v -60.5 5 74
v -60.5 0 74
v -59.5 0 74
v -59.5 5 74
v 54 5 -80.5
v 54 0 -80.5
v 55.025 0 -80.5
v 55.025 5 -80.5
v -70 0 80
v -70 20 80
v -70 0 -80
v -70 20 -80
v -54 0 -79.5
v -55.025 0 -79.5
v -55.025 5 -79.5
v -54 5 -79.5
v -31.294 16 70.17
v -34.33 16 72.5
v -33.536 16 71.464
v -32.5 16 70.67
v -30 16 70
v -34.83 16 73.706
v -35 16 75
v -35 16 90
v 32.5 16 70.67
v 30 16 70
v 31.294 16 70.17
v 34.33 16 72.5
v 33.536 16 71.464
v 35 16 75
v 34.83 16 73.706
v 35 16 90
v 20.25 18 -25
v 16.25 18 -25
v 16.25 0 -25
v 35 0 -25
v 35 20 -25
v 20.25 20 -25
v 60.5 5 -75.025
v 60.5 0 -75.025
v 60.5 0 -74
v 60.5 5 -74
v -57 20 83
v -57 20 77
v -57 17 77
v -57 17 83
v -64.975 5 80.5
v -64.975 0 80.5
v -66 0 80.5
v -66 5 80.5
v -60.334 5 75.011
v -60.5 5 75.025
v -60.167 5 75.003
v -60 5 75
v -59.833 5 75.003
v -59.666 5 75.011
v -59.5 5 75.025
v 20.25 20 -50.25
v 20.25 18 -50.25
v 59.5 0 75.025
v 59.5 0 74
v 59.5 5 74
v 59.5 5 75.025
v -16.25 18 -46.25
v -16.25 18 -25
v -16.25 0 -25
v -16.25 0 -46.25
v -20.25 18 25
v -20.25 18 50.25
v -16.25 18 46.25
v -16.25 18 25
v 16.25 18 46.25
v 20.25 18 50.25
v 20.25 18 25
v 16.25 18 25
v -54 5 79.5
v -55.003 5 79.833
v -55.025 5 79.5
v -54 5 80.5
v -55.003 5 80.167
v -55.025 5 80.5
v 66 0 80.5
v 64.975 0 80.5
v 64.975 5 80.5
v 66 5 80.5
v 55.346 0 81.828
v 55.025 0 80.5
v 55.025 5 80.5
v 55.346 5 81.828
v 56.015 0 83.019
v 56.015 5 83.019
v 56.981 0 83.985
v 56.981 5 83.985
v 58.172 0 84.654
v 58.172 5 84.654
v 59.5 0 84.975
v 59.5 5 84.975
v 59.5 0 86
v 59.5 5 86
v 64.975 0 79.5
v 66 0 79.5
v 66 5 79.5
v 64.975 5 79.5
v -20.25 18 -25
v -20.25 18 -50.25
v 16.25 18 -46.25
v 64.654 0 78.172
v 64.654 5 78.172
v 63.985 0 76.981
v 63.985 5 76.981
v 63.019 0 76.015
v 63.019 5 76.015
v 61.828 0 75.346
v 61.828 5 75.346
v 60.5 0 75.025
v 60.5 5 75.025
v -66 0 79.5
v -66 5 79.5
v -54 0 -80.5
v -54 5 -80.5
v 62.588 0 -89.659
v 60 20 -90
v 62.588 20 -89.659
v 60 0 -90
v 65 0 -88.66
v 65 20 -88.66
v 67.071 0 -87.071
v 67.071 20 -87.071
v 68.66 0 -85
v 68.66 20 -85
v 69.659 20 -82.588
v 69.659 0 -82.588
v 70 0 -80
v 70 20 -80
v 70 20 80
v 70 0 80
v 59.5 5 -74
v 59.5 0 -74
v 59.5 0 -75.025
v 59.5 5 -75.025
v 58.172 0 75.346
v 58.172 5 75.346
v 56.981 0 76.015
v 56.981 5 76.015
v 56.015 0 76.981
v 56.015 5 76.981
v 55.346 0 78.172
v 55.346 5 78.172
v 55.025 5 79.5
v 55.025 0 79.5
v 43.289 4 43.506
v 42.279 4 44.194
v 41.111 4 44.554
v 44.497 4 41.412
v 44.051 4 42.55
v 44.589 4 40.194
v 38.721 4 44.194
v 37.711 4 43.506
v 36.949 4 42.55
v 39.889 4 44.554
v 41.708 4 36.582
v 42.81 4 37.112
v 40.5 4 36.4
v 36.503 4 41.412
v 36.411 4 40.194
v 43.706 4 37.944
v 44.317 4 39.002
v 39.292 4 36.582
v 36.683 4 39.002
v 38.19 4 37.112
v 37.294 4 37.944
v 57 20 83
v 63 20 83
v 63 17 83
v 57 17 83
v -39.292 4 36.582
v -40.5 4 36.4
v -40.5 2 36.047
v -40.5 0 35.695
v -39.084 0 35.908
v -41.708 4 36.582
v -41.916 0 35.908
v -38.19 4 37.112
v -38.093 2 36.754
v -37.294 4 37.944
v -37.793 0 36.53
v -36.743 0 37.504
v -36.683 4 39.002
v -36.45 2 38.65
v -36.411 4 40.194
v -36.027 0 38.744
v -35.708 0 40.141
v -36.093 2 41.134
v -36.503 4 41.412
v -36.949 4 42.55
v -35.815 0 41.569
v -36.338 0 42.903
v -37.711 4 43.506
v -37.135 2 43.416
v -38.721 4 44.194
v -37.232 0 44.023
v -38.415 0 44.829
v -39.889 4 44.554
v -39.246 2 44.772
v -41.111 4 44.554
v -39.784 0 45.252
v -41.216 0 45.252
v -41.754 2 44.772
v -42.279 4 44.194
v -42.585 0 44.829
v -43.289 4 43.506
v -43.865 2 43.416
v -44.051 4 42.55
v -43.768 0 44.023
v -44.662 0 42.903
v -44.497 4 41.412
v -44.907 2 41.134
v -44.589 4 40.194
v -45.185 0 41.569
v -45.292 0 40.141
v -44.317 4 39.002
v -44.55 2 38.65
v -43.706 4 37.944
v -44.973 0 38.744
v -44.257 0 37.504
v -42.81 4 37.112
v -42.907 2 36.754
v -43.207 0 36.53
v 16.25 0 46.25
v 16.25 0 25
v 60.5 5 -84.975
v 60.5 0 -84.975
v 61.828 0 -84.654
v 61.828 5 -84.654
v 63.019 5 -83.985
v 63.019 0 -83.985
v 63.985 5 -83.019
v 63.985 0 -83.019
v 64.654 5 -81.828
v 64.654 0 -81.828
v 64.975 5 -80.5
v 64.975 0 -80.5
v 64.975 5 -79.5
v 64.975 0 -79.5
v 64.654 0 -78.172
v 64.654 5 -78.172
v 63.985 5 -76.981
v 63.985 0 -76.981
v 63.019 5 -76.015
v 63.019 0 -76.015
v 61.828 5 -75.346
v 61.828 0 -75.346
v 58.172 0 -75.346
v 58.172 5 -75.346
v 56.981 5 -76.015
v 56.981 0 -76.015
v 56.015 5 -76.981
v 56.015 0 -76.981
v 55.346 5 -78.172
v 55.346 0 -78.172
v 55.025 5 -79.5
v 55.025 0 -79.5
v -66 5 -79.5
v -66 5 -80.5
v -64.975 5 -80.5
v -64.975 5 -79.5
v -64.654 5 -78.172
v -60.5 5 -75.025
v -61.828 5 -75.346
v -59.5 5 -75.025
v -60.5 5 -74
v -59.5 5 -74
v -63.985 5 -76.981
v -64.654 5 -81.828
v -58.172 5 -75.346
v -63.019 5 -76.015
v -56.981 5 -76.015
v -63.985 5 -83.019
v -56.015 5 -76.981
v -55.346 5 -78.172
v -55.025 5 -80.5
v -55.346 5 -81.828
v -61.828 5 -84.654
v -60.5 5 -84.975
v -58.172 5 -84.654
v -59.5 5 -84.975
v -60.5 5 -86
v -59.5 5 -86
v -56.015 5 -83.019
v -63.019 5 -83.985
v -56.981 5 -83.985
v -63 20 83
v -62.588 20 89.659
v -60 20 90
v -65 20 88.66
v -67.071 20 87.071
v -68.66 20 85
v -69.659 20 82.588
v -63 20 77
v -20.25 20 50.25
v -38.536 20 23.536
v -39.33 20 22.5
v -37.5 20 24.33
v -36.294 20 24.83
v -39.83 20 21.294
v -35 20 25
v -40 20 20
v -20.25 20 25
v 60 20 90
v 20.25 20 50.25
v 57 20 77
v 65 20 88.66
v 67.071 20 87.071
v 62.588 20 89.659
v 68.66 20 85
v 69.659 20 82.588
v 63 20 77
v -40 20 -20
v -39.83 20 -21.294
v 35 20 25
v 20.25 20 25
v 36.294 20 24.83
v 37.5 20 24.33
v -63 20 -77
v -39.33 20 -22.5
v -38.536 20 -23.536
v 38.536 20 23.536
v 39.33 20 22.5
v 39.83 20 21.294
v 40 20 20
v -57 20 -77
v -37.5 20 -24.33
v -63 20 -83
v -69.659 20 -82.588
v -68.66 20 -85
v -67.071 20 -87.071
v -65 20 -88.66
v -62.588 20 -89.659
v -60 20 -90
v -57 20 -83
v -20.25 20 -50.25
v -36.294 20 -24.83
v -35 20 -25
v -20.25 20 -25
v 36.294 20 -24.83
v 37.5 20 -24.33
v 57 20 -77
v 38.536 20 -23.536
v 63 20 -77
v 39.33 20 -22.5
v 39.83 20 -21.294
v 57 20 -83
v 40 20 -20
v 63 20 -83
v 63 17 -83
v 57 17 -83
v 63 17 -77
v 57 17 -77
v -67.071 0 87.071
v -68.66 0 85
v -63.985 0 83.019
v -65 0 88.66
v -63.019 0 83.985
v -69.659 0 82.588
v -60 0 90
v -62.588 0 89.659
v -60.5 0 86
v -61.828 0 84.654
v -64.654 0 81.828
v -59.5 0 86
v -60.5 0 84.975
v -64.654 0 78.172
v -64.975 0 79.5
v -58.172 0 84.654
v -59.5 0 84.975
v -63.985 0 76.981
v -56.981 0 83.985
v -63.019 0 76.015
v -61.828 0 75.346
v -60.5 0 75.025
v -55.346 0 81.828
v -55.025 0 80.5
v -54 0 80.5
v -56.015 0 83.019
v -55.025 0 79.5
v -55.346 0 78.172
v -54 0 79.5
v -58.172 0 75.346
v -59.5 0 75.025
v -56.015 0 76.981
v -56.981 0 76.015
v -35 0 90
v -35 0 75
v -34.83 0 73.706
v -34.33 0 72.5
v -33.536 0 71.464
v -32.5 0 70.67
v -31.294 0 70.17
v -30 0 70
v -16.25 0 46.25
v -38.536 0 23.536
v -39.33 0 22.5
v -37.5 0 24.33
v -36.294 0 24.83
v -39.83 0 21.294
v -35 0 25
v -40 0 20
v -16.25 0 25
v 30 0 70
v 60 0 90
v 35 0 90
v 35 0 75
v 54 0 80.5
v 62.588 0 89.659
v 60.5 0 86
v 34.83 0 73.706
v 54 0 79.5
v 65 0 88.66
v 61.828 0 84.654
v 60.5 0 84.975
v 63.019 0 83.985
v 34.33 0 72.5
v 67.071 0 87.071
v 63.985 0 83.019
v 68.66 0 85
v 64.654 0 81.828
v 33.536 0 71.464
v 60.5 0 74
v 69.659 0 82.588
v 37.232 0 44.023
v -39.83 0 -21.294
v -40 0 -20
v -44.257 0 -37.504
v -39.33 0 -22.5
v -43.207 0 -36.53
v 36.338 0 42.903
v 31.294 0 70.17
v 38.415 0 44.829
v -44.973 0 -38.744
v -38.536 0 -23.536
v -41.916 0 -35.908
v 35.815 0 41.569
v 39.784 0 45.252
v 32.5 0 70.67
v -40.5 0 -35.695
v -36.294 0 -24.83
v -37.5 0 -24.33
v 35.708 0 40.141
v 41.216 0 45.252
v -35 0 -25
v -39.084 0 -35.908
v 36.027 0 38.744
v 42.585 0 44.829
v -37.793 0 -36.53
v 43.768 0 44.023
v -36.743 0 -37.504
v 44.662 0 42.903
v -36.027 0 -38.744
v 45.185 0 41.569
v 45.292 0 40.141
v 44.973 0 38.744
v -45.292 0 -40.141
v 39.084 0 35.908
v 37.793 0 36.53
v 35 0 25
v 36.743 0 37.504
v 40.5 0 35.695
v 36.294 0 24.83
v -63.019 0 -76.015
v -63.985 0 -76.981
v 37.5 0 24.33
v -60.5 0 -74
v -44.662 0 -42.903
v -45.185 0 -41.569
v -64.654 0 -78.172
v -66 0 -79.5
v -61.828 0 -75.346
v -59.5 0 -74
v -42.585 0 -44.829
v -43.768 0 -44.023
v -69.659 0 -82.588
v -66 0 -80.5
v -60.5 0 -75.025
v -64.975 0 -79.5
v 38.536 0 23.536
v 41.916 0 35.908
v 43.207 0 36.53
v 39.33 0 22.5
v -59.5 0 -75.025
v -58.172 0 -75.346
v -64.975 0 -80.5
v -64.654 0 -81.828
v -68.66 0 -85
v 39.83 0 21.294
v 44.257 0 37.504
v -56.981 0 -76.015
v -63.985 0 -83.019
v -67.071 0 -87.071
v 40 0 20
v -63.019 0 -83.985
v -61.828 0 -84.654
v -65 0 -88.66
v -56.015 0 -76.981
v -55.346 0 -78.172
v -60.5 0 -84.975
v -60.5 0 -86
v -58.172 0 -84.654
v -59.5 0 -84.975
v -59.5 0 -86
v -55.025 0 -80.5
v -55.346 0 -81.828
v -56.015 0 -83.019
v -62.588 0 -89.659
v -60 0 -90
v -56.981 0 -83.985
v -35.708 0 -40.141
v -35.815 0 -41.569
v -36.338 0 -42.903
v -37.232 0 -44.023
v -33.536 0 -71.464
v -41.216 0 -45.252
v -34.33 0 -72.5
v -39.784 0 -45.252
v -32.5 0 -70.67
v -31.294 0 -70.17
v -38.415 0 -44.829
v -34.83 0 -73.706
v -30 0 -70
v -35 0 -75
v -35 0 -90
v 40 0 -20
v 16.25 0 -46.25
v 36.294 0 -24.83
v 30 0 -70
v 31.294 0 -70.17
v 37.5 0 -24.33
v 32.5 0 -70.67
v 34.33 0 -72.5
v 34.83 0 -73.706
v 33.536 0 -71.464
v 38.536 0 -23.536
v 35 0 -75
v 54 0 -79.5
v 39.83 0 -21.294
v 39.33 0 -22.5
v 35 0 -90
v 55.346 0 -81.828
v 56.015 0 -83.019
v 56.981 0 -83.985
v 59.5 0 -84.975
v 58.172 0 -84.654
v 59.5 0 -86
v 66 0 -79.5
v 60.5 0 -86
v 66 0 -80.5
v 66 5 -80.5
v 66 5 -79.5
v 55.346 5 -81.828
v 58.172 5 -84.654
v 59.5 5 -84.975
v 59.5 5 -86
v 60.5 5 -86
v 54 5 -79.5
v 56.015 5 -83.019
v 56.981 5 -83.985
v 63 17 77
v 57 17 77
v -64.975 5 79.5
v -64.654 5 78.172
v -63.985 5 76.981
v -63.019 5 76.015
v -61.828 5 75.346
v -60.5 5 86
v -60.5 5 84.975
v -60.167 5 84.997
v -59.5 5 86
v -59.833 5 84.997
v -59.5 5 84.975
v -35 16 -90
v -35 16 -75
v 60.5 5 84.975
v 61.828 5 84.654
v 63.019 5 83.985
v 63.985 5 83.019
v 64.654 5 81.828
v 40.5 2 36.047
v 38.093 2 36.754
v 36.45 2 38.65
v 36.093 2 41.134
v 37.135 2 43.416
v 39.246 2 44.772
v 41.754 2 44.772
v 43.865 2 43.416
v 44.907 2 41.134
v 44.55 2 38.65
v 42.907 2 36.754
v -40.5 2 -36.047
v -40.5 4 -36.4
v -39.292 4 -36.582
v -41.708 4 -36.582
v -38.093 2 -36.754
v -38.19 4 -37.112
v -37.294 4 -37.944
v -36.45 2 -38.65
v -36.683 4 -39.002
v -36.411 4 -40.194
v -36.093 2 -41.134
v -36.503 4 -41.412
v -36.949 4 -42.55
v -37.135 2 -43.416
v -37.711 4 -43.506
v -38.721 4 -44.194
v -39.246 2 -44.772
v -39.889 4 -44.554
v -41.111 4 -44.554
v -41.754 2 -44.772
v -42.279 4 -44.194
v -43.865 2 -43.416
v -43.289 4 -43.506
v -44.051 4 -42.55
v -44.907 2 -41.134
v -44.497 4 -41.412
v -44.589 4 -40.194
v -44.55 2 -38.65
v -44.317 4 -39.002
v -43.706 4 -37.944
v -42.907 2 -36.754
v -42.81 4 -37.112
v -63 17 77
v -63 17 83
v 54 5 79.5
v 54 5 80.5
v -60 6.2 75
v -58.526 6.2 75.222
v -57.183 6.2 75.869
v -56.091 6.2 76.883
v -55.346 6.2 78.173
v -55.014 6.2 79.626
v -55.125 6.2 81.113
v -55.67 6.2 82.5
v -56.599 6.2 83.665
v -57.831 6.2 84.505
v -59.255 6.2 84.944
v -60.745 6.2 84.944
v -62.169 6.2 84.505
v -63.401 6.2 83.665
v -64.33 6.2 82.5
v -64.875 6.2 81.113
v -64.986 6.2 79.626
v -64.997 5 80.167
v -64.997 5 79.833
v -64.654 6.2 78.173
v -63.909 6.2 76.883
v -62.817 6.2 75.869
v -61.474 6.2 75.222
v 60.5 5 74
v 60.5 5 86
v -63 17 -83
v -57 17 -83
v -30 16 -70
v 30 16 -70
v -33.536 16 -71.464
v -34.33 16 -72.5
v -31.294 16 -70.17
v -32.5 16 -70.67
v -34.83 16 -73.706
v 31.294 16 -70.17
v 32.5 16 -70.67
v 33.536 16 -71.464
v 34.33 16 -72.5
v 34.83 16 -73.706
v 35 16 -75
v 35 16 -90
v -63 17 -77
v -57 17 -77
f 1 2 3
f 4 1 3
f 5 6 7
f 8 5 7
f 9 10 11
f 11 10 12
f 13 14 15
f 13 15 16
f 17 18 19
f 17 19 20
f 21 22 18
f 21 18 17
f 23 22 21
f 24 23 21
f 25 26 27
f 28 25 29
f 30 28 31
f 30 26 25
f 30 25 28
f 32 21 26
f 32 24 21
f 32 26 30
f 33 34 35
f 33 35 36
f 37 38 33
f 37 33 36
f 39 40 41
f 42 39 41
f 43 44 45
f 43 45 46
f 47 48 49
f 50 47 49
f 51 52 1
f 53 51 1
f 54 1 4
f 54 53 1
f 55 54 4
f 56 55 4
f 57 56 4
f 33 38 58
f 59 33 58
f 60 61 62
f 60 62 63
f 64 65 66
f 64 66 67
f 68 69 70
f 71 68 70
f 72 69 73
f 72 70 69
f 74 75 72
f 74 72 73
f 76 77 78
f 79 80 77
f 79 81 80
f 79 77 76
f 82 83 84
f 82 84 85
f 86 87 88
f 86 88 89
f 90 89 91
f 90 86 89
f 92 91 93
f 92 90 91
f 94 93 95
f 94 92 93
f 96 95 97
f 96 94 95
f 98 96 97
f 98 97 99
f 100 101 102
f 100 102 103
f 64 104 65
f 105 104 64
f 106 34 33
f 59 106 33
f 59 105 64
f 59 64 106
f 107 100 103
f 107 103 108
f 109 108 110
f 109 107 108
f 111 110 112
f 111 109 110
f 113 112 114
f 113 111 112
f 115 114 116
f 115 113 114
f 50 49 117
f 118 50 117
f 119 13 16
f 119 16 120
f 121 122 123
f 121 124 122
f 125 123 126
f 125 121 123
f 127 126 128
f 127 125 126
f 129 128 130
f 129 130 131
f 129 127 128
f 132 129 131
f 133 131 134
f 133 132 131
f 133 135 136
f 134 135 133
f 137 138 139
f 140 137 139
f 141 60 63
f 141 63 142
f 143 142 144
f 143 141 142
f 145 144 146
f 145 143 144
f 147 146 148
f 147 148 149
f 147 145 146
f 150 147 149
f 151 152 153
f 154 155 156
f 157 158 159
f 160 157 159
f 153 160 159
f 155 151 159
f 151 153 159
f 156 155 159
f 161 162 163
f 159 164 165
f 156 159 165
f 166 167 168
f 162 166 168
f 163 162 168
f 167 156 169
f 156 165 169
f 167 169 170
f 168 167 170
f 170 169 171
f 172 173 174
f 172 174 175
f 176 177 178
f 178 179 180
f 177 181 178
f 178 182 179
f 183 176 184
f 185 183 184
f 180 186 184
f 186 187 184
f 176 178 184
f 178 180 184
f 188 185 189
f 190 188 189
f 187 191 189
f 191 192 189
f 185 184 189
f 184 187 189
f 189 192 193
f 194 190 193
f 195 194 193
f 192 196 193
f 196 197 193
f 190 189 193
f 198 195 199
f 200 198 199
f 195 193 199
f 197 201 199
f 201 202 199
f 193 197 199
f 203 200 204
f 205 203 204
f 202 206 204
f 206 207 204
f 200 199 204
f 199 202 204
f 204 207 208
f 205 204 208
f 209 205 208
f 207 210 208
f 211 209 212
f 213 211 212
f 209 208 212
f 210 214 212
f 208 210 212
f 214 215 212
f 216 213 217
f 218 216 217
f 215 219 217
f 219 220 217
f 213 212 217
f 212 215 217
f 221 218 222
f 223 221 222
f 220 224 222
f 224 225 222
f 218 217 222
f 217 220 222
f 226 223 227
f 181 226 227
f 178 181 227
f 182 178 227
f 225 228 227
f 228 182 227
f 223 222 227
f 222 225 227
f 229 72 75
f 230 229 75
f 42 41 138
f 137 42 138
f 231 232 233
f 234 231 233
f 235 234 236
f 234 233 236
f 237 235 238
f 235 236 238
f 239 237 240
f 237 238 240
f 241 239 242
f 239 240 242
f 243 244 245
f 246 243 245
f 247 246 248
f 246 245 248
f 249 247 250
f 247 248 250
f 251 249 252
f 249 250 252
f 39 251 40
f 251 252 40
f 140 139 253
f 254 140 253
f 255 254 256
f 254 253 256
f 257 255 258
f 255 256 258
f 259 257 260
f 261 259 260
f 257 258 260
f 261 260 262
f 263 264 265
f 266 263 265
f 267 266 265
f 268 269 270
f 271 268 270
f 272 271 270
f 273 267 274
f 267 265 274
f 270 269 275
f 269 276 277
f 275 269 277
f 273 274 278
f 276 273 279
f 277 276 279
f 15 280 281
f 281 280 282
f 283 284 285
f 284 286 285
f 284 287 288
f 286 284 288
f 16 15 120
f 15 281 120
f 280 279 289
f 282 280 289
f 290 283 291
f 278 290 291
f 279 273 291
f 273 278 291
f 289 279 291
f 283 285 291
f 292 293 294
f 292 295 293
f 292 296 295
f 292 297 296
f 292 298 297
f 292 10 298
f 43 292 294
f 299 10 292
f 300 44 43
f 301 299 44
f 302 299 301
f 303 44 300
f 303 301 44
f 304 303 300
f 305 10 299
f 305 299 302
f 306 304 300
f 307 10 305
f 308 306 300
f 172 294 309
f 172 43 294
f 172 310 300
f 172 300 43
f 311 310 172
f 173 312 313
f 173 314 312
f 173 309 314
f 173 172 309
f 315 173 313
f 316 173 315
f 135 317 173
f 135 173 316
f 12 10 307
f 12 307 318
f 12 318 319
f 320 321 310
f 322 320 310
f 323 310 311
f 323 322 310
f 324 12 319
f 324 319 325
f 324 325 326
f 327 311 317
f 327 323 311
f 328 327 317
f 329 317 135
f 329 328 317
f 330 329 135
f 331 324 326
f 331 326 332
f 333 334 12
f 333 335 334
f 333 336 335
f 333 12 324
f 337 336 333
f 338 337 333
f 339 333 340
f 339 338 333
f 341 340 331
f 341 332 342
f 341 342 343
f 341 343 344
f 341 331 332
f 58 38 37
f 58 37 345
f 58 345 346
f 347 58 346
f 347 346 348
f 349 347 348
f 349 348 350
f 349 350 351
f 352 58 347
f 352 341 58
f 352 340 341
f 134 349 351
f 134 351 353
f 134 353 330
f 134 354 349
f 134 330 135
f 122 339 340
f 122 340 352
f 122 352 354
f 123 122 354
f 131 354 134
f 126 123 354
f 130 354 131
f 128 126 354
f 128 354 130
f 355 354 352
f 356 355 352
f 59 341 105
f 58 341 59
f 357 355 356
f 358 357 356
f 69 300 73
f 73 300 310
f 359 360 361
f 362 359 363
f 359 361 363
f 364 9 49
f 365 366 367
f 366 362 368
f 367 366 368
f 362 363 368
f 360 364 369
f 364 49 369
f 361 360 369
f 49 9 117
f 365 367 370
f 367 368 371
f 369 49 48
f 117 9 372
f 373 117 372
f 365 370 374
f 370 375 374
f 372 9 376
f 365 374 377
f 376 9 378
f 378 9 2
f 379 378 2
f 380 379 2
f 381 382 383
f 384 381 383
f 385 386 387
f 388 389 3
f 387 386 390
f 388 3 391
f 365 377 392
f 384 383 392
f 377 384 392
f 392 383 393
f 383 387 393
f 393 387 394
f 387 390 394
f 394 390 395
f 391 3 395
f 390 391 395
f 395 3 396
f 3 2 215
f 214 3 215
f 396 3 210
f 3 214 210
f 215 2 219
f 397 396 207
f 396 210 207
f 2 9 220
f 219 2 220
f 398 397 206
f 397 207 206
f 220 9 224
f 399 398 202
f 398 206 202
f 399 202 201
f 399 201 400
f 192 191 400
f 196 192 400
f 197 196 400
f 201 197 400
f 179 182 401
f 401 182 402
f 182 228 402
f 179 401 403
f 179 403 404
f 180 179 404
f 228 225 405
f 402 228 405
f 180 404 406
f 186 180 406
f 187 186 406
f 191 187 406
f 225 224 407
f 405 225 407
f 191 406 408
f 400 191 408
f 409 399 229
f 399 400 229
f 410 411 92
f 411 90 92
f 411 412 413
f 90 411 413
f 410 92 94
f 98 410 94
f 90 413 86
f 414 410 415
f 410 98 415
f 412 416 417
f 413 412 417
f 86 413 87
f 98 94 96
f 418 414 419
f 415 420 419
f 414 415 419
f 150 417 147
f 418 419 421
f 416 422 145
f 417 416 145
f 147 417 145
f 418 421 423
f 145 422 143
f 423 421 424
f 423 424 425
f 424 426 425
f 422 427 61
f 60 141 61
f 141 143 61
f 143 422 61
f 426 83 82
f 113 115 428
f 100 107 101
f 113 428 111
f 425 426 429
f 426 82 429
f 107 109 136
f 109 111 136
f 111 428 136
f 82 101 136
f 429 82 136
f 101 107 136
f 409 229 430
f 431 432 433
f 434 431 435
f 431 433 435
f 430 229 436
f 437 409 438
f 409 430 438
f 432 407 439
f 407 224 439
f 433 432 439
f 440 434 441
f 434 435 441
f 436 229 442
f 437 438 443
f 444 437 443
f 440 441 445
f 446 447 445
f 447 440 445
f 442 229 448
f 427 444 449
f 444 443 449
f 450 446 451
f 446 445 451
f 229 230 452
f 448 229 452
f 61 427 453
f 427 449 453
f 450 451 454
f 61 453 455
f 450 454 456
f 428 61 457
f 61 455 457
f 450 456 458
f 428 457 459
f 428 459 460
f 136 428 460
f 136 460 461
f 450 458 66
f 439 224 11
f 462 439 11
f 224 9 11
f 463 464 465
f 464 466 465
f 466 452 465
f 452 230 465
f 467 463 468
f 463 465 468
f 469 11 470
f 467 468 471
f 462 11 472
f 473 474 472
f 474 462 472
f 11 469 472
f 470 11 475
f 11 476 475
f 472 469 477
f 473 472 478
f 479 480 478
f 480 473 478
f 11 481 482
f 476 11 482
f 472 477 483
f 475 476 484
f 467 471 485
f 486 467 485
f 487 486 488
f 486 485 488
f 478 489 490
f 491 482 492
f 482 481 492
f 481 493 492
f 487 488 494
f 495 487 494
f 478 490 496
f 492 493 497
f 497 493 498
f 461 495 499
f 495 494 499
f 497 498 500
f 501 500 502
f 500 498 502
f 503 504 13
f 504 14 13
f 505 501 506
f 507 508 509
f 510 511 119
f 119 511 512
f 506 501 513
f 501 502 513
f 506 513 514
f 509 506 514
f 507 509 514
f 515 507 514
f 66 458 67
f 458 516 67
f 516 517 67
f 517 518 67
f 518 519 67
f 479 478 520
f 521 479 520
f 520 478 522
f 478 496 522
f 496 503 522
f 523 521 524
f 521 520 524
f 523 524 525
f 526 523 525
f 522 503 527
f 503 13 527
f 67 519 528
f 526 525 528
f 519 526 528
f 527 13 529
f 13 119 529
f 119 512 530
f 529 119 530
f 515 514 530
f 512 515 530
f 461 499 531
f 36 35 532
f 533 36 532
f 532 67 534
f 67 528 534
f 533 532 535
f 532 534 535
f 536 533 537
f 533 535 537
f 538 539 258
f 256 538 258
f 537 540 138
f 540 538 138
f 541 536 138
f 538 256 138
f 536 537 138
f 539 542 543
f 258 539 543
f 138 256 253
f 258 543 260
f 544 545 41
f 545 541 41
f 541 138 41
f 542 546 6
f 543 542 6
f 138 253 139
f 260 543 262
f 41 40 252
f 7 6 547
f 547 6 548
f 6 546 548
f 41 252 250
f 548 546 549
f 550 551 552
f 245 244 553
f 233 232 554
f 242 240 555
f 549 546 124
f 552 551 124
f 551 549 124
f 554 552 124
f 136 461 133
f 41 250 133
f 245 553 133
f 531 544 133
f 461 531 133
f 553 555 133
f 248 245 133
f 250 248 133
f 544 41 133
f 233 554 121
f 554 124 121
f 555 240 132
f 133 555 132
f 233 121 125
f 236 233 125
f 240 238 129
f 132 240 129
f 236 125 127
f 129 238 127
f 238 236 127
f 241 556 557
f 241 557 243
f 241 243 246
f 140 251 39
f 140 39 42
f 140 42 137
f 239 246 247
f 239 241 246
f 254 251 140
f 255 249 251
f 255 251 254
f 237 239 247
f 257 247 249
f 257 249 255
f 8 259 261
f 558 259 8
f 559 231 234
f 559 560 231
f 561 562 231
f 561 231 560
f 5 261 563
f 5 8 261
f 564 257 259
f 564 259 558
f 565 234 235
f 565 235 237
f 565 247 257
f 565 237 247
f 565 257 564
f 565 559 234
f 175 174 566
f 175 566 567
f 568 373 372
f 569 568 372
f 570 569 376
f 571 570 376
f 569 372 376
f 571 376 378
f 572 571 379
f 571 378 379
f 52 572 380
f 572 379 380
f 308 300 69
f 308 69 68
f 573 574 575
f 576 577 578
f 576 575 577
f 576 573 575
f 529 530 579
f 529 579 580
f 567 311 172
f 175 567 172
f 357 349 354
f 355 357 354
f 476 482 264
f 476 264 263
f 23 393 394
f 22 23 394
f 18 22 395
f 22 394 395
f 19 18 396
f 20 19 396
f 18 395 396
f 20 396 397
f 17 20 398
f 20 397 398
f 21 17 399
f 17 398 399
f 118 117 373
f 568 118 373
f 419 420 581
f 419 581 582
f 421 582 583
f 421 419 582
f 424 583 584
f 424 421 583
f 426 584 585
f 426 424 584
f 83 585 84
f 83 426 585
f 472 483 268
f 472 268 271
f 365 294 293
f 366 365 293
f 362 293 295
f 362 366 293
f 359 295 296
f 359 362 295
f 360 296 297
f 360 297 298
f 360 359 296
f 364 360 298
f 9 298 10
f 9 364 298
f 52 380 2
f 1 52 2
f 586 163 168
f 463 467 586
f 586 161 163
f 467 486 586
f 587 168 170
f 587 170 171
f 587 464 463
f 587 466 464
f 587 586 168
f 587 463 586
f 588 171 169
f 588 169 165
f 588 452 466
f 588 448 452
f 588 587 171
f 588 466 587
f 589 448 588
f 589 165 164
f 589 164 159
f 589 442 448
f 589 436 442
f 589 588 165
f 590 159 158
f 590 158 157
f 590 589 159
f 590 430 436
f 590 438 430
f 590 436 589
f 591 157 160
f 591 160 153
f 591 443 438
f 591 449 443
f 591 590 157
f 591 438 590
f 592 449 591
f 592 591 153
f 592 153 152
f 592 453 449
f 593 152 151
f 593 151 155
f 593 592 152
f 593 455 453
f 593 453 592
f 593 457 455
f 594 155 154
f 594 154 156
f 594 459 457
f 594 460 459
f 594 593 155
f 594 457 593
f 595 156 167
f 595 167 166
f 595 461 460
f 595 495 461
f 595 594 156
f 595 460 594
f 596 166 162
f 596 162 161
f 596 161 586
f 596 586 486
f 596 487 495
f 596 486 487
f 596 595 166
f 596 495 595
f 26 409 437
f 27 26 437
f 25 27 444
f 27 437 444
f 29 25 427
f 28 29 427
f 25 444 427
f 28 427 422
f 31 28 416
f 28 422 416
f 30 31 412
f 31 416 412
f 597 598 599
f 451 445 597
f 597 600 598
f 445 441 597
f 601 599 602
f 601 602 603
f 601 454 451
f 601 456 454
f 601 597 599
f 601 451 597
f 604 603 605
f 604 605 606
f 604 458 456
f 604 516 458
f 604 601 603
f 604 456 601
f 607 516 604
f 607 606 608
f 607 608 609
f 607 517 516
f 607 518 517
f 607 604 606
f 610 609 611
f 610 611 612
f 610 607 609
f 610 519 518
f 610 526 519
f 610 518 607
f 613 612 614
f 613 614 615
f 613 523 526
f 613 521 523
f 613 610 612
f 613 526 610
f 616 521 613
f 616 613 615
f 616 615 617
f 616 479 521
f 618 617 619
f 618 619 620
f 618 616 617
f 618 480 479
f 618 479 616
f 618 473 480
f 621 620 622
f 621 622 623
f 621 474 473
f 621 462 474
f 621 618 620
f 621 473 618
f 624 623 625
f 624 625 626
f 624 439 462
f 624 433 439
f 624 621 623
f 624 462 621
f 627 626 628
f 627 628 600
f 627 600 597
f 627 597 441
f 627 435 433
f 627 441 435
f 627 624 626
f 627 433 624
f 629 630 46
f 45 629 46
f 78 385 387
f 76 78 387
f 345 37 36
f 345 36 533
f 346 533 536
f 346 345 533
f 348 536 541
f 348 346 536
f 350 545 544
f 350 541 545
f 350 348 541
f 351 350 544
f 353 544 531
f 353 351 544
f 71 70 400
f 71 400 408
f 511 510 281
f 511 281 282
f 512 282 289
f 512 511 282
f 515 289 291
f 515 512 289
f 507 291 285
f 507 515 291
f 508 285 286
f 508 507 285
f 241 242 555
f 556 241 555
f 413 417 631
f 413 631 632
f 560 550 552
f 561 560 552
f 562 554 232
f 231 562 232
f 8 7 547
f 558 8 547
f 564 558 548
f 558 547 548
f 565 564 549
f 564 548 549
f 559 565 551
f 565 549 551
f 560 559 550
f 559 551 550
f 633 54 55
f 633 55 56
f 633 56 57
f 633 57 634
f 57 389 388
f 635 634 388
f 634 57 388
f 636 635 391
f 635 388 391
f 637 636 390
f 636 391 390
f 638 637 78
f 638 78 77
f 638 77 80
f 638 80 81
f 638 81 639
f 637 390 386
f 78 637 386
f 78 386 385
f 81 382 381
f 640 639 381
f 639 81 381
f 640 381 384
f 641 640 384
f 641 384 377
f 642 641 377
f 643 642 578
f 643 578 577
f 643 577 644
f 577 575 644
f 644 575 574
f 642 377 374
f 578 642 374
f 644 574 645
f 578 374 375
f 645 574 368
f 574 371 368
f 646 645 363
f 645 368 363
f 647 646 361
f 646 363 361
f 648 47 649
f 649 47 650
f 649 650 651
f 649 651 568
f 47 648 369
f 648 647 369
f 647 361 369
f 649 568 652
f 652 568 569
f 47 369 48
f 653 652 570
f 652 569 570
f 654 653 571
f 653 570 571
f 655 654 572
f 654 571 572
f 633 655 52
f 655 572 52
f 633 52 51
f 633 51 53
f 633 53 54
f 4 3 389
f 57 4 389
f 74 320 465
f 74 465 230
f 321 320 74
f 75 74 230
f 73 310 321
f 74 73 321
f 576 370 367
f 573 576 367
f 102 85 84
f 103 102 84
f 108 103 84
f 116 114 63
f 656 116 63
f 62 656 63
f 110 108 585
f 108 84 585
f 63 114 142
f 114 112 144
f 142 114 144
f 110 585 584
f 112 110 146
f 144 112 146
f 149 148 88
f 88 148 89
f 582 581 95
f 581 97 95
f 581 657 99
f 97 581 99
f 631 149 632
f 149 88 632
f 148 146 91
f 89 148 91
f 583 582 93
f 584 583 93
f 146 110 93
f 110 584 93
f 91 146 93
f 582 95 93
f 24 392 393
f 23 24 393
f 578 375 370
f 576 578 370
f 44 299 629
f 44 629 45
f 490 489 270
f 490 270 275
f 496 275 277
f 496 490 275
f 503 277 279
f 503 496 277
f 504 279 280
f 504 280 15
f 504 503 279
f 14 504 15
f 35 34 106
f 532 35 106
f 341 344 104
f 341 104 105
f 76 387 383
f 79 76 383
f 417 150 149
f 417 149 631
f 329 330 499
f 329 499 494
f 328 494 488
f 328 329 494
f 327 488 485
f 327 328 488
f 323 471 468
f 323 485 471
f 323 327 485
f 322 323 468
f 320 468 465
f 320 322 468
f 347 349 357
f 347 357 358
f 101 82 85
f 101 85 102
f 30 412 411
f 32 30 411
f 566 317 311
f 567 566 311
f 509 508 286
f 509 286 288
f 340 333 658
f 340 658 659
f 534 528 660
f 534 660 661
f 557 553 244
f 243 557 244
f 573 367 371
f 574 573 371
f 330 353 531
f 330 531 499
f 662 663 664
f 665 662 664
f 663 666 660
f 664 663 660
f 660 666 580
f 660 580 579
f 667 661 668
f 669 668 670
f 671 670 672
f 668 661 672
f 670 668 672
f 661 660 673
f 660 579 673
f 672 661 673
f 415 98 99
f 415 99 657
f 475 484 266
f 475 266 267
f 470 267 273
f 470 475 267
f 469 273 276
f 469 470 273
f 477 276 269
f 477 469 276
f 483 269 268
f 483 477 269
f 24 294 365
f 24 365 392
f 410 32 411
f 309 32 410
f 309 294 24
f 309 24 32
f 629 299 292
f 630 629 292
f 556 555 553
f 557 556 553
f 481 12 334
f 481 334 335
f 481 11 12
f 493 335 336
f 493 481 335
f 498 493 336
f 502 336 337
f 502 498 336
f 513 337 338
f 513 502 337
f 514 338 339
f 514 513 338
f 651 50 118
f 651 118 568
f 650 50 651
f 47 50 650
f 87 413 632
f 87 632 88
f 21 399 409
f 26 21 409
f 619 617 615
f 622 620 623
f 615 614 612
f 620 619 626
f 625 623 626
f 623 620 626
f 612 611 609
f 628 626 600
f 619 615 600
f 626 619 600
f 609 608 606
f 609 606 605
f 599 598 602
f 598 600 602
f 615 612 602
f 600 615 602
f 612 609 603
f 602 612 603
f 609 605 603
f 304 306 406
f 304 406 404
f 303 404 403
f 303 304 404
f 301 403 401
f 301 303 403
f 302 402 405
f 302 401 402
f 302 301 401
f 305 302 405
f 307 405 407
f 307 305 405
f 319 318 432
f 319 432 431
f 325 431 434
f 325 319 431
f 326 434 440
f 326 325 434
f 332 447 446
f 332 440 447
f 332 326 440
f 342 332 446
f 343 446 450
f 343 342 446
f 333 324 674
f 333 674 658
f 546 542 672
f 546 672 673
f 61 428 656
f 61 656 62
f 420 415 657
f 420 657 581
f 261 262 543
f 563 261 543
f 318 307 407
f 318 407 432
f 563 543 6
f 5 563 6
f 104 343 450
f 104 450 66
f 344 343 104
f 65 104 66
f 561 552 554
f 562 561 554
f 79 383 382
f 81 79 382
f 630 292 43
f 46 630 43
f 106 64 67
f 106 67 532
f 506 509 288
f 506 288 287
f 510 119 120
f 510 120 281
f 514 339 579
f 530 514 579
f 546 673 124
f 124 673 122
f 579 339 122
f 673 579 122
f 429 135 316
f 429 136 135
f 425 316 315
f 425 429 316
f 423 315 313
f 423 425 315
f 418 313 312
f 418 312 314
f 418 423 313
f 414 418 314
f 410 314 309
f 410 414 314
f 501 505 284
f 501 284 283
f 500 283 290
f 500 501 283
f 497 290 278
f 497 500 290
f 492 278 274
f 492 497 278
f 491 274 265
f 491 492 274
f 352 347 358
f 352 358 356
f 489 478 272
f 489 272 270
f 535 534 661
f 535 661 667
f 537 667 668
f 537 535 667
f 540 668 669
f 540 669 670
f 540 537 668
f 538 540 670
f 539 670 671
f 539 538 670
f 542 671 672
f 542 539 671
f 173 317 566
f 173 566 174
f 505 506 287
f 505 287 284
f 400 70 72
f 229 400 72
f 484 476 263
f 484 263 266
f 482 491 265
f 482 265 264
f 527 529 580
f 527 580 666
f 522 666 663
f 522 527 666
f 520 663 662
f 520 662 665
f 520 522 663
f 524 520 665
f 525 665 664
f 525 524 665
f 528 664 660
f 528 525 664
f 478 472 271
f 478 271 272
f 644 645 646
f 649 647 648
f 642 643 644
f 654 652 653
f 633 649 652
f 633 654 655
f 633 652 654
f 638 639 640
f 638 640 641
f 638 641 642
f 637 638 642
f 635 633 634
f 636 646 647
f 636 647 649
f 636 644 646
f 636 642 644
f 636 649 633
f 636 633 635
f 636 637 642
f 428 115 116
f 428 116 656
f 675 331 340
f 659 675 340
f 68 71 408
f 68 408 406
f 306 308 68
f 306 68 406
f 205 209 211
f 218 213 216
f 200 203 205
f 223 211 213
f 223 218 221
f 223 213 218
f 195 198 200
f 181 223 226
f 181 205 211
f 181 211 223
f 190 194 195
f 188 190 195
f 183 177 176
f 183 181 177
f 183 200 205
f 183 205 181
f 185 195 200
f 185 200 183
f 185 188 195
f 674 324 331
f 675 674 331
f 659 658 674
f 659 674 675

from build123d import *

# Parameters (mm, degrees)
SKETCH_1_W                                 = 200
SKETCH_1_H                                 = 200
EXTRUDE_1_DEPTH                            = 20
SKETCH_2_W                                 = 200
SKETCH_2_H                                 = 200
SKETCH_2_W_2                               = 140
SKETCH_2_H_2                               = 180
CUT_EXTRUDE_2_DEPTH                        = 143.828568571
FILLET_1_R                                 = 10
FILLET_2_R                                 = 10
FILLET_3_R                                 = 10
FILLET_4_R                                 = 10
CUT_EXTRUDE_4_DEPTH                        = 5
MIRROR_3_AT_THE_SECOND_PLANE_COPY_1_DEPTH  = 5
SKETCH_5_R                                 = 5
CUT_EXTRUDE_5_DEPTH                        = 6.2
CUT_EXTRUDE_7_DEPTH                        = 16
SKETCH_8_R                                 = 4.1
CUT_EXTRUDE_8_DEPTH                        = 4
DRAFT_2_ANGLE                              = 10
DRAFT_2_OF_MIRROR_10_2_ANGLE               = 10
DRAFT_2_OF_MIRROR_11_2_ANGLE               = 10
SKETCH_14_W                                = 6
SKETCH_14_H                                = 6
CUT_EXTRUDE_9_DEPTH                        = 3
MIRROR_12_AT_THE_SECOND_PLANE_COPY_1_SKE_W = 6
MIRROR_12_AT_THE_SECOND_PLANE_COPY_1_SKE_H = 6
MIRROR_12_AT_THE_SECOND_PLANE_COPY_1_DEPTH = 3
SKETCH_16_W                                = 40.5
SKETCH_16_H                                = 100.5
CUT_EXTRUDE_10_DEPTH                       = 2
SKETCH_17_W                                = 32.5
SKETCH_17_H                                = 92.5
CUT_EXTRUDE_11_DEPTH                       = 116.429632244
CUT_EXTRUDE_12_DEPTH                       = 116.758369028


with BuildPart() as part:
    # 草图1 → 凸台-拉伸1 (new body)
    with BuildSketch(Plane(origin=(0, 0, 0), x_dir=(1, 0, 0), z_dir=(0, 1, 0))):
        Rectangle(SKETCH_1_W, SKETCH_1_H)
    extrude(amount=EXTRUDE_1_DEPTH)

    # 草图2 → 切除-拉伸2 (cut, through all)
    with BuildSketch(Plane(origin=(0, 20, 0), x_dir=(1, 0, 0), z_dir=(0, 1, 0))):
        Rectangle(SKETCH_2_W, SKETCH_2_H)
        Rectangle(SKETCH_2_W_2, SKETCH_2_H_2, mode=Mode.SUBTRACT)
    extrude(amount=-CUT_EXTRUDE_2_DEPTH, mode=Mode.SUBTRACT)

    # 圆角1
    fillet_1_edges = [part.edges().sort_by_distance(p)[0] for p in [
        (-70, 10, -90),
    ]]
    fillet(fillet_1_edges, radius=FILLET_1_R)

    # 圆角2
    fillet_2_edges = [part.edges().sort_by_distance(p)[0] for p in [
        (70, 10, -90),
    ]]
    fillet(fillet_2_edges, radius=FILLET_2_R)

    # 圆角3
    fillet_3_edges = [part.edges().sort_by_distance(p)[0] for p in [
        (70, 10, 90),
    ]]
    fillet(fillet_3_edges, radius=FILLET_3_R)

    # 圆角4
    fillet_4_edges = [part.edges().sort_by_distance(p)[0] for p in [
        (-70, 10, 90),
    ]]
    fillet(fillet_4_edges, radius=FILLET_4_R)

    # 草图4 → 切除-拉伸4 (cut)
    with BuildSketch(Plane.XZ):
        with BuildLine():
            Line((-59.5, 84.974937186), (-59.5, 86))
            Line((-59.5, 86), (-60.5, 86))
            Line((-60.5, 86), (-60.5, 84.974937186))
            ThreePointArc((-60.5, 84.974937186), (-63.535533906, 83.535533906), (-64.974937186, 80.5))
            Line((-64.974937186, 80.5), (-66, 80.5))
            Line((-66, 80.5), (-66, 79.5))
            Line((-66, 79.5), (-64.974937186, 79.5))
            ThreePointArc((-64.974937186, 79.5), (-63.535533906, 76.464466094), (-60.5, 75.025062814))
            Line((-60.5, 75.025062814), (-60.5, 74))
            Line((-60.5, 74), (-59.5, 74))
            Line((-59.5, 74), (-59.5, 75.025062814))
            ThreePointArc((-59.5, 75.025062814), (-56.464466094, 76.464466094), (-55.025062814, 79.5))
            Line((-55.025062814, 79.5), (-54, 79.5))
            Line((-54, 79.5), (-54, 80.5))
            Line((-54, 80.5), (-55.025062814, 80.5))
            ThreePointArc((-55.025062814, 80.5), (-56.464466094, 83.535533906), (-59.5, 84.974937186))
        make_face()
    cut_extrude_4 = extrude(amount=-CUT_EXTRUDE_4_DEPTH, mode=Mode.SUBTRACT)

    # 镜向3: 切除-拉伸4 across plane
    add(cut_extrude_4.mirror(Plane(origin=(0, 0, 0), x_dir=(0, 0, 1), z_dir=(1, 0, 0))), mode=Mode.SUBTRACT)

    # 镜向3 at the second plane: 切除-拉伸4 across plane
    add(cut_extrude_4.mirror(Plane.XY), mode=Mode.SUBTRACT)

    # 镜向3 at the second plane copy 1 sket → 镜向3 at the second plane copy 1 (cut)
    with BuildSketch(Plane(origin=(0, 0, 0), x_dir=(-1, 0, 0), z_dir=(0, -1, 0))):
        with BuildLine():
            Line((-59.5, 84.974937186), (-59.5, 86))
            Line((-59.5, 86), (-60.5, 86))
            Line((-60.5, 86), (-60.5, 84.974937186))
            ThreePointArc((-60.5, 84.974937186), (-63.535533906, 83.535533906), (-64.974937186, 80.5))
            Line((-64.974937186, 80.5), (-66, 80.5))
            Line((-66, 80.5), (-66, 79.5))
            Line((-66, 79.5), (-64.974937186, 79.5))
            ThreePointArc((-64.974937186, 79.5), (-63.535533906, 76.464466094), (-60.5, 75.025062814))
            Line((-60.5, 75.025062814), (-60.5, 74))
            Line((-60.5, 74), (-59.5, 74))
            Line((-59.5, 74), (-59.5, 75.025062814))
            ThreePointArc((-59.5, 75.025062814), (-56.464466094, 76.464466094), (-55.025062814, 79.5))
            Line((-55.025062814, 79.5), (-54, 79.5))
            Line((-54, 79.5), (-54, 80.5))
            Line((-54, 80.5), (-55.025062814, 80.5))
            ThreePointArc((-55.025062814, 80.5), (-56.464466094, 83.535533906), (-59.5, 84.974937186))
        make_face()
    extrude(amount=-MIRROR_3_AT_THE_SECOND_PLANE_COPY_1_DEPTH, mode=Mode.SUBTRACT)

    # 草图5 → 切除-拉伸5 (cut)
    with BuildSketch(Plane.XZ):
        with Locations(Location((-60, 80, 0), (0, 0, 270))):
            Circle(SKETCH_5_R)
    extrude(amount=-CUT_EXTRUDE_5_DEPTH, mode=Mode.SUBTRACT)

    # 草图7 → 切除-拉伸7 (cut)
    with BuildSketch(Plane.XZ):
        with BuildLine():
            Line((35, 110), (-35, 110))
            Line((-35, 110), (-35, 75))
            ThreePointArc((-35, 75), (-33.535533906, 71.464466094), (-30, 70))
            Line((-30, 70), (30, 70))
            ThreePointArc((30, 70), (33.535533906, 71.464466094), (35, 75))
            Line((35, 75), (35, 110))
        make_face()
    cut_extrude_7 = extrude(amount=-CUT_EXTRUDE_7_DEPTH, mode=Mode.SUBTRACT)

    # 镜向6: 切除-拉伸7 across plane
    add(cut_extrude_7.mirror(Plane.XY), mode=Mode.SUBTRACT)

    # 草图8 → 切除-拉伸8 (cut)
    with BuildSketch(Plane.XZ):
        with Locations(Location((-40.5, 40.5, 0), (0, 0, 270))):
            Circle(SKETCH_8_R)
    cut_extrude_8 = extrude(amount=-CUT_EXTRUDE_8_DEPTH, mode=Mode.SUBTRACT)

    # 拔模2
    draft_2_faces = [part.faces().sort_by_distance(p)[0] for p in [
        (-40.5, 2, 44.6),
    ]]
    draft(draft_2_faces, Plane(origin=(-40.5, 4, 40.5), x_dir=(0, 0, -1), z_dir=(0, -1, 0)), DRAFT_2_ANGLE)

    # 镜向10: 切除-拉伸8 across plane
    add(cut_extrude_8.mirror(Plane(origin=(0, 0, 0), x_dir=(0, 0, 1), z_dir=(1, 0, 0))), mode=Mode.SUBTRACT)

    # 拔模2 of Mirror 10 2
    draft_2_of_mirror_10_2_faces = [part.faces().sort_by_distance(p)[0] for p in [
        (40.5, 2, 44.6),
    ]]
    draft(draft_2_of_mirror_10_2_faces, Plane(origin=(40.5, 4, 40.5), x_dir=(0, 0, -1), z_dir=(0, -1, 0)), DRAFT_2_OF_MIRROR_10_2_ANGLE)

    # 镜向11: 切除-拉伸8 across plane
    add(cut_extrude_8.mirror(Plane.XY), mode=Mode.SUBTRACT)

    # 拔模2 of Mirror 11 2
    draft_2_of_mirror_11_2_faces = [part.faces().sort_by_distance(p)[0] for p in [
        (-40.5, 2, -44.6),
    ]]
    draft(draft_2_of_mirror_11_2_faces, Plane(origin=(-40.5, 4, -40.5), x_dir=(0, 0, 1), z_dir=(0, -1, 0)), DRAFT_2_OF_MIRROR_11_2_ANGLE)

    # 草图14 → 切除-拉伸9 (cut)
    with BuildSketch(Plane(origin=(0, 20, 0), x_dir=(1, 0, 0), z_dir=(0, 1, 0))):
        with Locations((-60, 80)):
            Rectangle(SKETCH_14_W, SKETCH_14_H)
    cut_extrude_9 = extrude(amount=-CUT_EXTRUDE_9_DEPTH, mode=Mode.SUBTRACT)

    # 镜向12: 切除-拉伸9 across plane
    add(cut_extrude_9.mirror(Plane(origin=(0, 0, 0), x_dir=(0, 0, 1), z_dir=(1, 0, 0))), mode=Mode.SUBTRACT)

    # 镜向12 at the second plane: 切除-拉伸9 across plane
    add(cut_extrude_9.mirror(Plane.XY), mode=Mode.SUBTRACT)

    # 镜向12 at the second plane copy 1 ske → 镜向12 at the second plane copy 1 (cut)
    with BuildSketch(Plane(origin=(0, 20, 0), x_dir=(-1, 0, 0), z_dir=(0, 1, 0))):
        with Locations((-60, 80)):
            Rectangle(MIRROR_12_AT_THE_SECOND_PLANE_COPY_1_SKE_W, MIRROR_12_AT_THE_SECOND_PLANE_COPY_1_SKE_H)
    extrude(amount=-MIRROR_12_AT_THE_SECOND_PLANE_COPY_1_DEPTH, mode=Mode.SUBTRACT)

    # 草图16 → 切除-拉伸10 (cut)
    with BuildSketch(Plane(origin=(0, 20, 0), x_dir=(1, 0, 0), z_dir=(0, 1, 0))):
        Rectangle(SKETCH_16_W, SKETCH_16_H)
    extrude(amount=-CUT_EXTRUDE_10_DEPTH, mode=Mode.SUBTRACT)

    # 草图17 → 切除-拉伸11 (cut, through all)
    with BuildSketch(Plane(origin=(0, 18, 0), x_dir=(1, 0, 0), z_dir=(0, 1, 0))):
        Rectangle(SKETCH_17_W, SKETCH_17_H)
    extrude(amount=-CUT_EXTRUDE_11_DEPTH, mode=Mode.SUBTRACT)

    # 草图18 → 切除-拉伸12 (cut, through all)
    with BuildSketch(Plane(origin=(0, 20, 0), x_dir=(1, 0, 0), z_dir=(0, 1, 0))):
        with BuildLine():
            Line((35, -25), (-35, -25))
            ThreePointArc((-35, -25), (-38.535533906, -23.535533906), (-40, -20))
            Line((-40, -20), (-40, 20))
            ThreePointArc((-40, 20), (-38.535533906, 23.535533906), (-35, 25))
            Line((-35, 25), (35, 25))
            ThreePointArc((35, 25), (38.535533906, 23.535533906), (40, 20))
            Line((40, 20), (40, -20))
            ThreePointArc((40, -20), (38.535533906, -23.535533906), (35, -25))
        make_face()
    extrude(amount=-CUT_EXTRUDE_12_DEPTH, mode=Mode.SUBTRACT)


solid = part.part
